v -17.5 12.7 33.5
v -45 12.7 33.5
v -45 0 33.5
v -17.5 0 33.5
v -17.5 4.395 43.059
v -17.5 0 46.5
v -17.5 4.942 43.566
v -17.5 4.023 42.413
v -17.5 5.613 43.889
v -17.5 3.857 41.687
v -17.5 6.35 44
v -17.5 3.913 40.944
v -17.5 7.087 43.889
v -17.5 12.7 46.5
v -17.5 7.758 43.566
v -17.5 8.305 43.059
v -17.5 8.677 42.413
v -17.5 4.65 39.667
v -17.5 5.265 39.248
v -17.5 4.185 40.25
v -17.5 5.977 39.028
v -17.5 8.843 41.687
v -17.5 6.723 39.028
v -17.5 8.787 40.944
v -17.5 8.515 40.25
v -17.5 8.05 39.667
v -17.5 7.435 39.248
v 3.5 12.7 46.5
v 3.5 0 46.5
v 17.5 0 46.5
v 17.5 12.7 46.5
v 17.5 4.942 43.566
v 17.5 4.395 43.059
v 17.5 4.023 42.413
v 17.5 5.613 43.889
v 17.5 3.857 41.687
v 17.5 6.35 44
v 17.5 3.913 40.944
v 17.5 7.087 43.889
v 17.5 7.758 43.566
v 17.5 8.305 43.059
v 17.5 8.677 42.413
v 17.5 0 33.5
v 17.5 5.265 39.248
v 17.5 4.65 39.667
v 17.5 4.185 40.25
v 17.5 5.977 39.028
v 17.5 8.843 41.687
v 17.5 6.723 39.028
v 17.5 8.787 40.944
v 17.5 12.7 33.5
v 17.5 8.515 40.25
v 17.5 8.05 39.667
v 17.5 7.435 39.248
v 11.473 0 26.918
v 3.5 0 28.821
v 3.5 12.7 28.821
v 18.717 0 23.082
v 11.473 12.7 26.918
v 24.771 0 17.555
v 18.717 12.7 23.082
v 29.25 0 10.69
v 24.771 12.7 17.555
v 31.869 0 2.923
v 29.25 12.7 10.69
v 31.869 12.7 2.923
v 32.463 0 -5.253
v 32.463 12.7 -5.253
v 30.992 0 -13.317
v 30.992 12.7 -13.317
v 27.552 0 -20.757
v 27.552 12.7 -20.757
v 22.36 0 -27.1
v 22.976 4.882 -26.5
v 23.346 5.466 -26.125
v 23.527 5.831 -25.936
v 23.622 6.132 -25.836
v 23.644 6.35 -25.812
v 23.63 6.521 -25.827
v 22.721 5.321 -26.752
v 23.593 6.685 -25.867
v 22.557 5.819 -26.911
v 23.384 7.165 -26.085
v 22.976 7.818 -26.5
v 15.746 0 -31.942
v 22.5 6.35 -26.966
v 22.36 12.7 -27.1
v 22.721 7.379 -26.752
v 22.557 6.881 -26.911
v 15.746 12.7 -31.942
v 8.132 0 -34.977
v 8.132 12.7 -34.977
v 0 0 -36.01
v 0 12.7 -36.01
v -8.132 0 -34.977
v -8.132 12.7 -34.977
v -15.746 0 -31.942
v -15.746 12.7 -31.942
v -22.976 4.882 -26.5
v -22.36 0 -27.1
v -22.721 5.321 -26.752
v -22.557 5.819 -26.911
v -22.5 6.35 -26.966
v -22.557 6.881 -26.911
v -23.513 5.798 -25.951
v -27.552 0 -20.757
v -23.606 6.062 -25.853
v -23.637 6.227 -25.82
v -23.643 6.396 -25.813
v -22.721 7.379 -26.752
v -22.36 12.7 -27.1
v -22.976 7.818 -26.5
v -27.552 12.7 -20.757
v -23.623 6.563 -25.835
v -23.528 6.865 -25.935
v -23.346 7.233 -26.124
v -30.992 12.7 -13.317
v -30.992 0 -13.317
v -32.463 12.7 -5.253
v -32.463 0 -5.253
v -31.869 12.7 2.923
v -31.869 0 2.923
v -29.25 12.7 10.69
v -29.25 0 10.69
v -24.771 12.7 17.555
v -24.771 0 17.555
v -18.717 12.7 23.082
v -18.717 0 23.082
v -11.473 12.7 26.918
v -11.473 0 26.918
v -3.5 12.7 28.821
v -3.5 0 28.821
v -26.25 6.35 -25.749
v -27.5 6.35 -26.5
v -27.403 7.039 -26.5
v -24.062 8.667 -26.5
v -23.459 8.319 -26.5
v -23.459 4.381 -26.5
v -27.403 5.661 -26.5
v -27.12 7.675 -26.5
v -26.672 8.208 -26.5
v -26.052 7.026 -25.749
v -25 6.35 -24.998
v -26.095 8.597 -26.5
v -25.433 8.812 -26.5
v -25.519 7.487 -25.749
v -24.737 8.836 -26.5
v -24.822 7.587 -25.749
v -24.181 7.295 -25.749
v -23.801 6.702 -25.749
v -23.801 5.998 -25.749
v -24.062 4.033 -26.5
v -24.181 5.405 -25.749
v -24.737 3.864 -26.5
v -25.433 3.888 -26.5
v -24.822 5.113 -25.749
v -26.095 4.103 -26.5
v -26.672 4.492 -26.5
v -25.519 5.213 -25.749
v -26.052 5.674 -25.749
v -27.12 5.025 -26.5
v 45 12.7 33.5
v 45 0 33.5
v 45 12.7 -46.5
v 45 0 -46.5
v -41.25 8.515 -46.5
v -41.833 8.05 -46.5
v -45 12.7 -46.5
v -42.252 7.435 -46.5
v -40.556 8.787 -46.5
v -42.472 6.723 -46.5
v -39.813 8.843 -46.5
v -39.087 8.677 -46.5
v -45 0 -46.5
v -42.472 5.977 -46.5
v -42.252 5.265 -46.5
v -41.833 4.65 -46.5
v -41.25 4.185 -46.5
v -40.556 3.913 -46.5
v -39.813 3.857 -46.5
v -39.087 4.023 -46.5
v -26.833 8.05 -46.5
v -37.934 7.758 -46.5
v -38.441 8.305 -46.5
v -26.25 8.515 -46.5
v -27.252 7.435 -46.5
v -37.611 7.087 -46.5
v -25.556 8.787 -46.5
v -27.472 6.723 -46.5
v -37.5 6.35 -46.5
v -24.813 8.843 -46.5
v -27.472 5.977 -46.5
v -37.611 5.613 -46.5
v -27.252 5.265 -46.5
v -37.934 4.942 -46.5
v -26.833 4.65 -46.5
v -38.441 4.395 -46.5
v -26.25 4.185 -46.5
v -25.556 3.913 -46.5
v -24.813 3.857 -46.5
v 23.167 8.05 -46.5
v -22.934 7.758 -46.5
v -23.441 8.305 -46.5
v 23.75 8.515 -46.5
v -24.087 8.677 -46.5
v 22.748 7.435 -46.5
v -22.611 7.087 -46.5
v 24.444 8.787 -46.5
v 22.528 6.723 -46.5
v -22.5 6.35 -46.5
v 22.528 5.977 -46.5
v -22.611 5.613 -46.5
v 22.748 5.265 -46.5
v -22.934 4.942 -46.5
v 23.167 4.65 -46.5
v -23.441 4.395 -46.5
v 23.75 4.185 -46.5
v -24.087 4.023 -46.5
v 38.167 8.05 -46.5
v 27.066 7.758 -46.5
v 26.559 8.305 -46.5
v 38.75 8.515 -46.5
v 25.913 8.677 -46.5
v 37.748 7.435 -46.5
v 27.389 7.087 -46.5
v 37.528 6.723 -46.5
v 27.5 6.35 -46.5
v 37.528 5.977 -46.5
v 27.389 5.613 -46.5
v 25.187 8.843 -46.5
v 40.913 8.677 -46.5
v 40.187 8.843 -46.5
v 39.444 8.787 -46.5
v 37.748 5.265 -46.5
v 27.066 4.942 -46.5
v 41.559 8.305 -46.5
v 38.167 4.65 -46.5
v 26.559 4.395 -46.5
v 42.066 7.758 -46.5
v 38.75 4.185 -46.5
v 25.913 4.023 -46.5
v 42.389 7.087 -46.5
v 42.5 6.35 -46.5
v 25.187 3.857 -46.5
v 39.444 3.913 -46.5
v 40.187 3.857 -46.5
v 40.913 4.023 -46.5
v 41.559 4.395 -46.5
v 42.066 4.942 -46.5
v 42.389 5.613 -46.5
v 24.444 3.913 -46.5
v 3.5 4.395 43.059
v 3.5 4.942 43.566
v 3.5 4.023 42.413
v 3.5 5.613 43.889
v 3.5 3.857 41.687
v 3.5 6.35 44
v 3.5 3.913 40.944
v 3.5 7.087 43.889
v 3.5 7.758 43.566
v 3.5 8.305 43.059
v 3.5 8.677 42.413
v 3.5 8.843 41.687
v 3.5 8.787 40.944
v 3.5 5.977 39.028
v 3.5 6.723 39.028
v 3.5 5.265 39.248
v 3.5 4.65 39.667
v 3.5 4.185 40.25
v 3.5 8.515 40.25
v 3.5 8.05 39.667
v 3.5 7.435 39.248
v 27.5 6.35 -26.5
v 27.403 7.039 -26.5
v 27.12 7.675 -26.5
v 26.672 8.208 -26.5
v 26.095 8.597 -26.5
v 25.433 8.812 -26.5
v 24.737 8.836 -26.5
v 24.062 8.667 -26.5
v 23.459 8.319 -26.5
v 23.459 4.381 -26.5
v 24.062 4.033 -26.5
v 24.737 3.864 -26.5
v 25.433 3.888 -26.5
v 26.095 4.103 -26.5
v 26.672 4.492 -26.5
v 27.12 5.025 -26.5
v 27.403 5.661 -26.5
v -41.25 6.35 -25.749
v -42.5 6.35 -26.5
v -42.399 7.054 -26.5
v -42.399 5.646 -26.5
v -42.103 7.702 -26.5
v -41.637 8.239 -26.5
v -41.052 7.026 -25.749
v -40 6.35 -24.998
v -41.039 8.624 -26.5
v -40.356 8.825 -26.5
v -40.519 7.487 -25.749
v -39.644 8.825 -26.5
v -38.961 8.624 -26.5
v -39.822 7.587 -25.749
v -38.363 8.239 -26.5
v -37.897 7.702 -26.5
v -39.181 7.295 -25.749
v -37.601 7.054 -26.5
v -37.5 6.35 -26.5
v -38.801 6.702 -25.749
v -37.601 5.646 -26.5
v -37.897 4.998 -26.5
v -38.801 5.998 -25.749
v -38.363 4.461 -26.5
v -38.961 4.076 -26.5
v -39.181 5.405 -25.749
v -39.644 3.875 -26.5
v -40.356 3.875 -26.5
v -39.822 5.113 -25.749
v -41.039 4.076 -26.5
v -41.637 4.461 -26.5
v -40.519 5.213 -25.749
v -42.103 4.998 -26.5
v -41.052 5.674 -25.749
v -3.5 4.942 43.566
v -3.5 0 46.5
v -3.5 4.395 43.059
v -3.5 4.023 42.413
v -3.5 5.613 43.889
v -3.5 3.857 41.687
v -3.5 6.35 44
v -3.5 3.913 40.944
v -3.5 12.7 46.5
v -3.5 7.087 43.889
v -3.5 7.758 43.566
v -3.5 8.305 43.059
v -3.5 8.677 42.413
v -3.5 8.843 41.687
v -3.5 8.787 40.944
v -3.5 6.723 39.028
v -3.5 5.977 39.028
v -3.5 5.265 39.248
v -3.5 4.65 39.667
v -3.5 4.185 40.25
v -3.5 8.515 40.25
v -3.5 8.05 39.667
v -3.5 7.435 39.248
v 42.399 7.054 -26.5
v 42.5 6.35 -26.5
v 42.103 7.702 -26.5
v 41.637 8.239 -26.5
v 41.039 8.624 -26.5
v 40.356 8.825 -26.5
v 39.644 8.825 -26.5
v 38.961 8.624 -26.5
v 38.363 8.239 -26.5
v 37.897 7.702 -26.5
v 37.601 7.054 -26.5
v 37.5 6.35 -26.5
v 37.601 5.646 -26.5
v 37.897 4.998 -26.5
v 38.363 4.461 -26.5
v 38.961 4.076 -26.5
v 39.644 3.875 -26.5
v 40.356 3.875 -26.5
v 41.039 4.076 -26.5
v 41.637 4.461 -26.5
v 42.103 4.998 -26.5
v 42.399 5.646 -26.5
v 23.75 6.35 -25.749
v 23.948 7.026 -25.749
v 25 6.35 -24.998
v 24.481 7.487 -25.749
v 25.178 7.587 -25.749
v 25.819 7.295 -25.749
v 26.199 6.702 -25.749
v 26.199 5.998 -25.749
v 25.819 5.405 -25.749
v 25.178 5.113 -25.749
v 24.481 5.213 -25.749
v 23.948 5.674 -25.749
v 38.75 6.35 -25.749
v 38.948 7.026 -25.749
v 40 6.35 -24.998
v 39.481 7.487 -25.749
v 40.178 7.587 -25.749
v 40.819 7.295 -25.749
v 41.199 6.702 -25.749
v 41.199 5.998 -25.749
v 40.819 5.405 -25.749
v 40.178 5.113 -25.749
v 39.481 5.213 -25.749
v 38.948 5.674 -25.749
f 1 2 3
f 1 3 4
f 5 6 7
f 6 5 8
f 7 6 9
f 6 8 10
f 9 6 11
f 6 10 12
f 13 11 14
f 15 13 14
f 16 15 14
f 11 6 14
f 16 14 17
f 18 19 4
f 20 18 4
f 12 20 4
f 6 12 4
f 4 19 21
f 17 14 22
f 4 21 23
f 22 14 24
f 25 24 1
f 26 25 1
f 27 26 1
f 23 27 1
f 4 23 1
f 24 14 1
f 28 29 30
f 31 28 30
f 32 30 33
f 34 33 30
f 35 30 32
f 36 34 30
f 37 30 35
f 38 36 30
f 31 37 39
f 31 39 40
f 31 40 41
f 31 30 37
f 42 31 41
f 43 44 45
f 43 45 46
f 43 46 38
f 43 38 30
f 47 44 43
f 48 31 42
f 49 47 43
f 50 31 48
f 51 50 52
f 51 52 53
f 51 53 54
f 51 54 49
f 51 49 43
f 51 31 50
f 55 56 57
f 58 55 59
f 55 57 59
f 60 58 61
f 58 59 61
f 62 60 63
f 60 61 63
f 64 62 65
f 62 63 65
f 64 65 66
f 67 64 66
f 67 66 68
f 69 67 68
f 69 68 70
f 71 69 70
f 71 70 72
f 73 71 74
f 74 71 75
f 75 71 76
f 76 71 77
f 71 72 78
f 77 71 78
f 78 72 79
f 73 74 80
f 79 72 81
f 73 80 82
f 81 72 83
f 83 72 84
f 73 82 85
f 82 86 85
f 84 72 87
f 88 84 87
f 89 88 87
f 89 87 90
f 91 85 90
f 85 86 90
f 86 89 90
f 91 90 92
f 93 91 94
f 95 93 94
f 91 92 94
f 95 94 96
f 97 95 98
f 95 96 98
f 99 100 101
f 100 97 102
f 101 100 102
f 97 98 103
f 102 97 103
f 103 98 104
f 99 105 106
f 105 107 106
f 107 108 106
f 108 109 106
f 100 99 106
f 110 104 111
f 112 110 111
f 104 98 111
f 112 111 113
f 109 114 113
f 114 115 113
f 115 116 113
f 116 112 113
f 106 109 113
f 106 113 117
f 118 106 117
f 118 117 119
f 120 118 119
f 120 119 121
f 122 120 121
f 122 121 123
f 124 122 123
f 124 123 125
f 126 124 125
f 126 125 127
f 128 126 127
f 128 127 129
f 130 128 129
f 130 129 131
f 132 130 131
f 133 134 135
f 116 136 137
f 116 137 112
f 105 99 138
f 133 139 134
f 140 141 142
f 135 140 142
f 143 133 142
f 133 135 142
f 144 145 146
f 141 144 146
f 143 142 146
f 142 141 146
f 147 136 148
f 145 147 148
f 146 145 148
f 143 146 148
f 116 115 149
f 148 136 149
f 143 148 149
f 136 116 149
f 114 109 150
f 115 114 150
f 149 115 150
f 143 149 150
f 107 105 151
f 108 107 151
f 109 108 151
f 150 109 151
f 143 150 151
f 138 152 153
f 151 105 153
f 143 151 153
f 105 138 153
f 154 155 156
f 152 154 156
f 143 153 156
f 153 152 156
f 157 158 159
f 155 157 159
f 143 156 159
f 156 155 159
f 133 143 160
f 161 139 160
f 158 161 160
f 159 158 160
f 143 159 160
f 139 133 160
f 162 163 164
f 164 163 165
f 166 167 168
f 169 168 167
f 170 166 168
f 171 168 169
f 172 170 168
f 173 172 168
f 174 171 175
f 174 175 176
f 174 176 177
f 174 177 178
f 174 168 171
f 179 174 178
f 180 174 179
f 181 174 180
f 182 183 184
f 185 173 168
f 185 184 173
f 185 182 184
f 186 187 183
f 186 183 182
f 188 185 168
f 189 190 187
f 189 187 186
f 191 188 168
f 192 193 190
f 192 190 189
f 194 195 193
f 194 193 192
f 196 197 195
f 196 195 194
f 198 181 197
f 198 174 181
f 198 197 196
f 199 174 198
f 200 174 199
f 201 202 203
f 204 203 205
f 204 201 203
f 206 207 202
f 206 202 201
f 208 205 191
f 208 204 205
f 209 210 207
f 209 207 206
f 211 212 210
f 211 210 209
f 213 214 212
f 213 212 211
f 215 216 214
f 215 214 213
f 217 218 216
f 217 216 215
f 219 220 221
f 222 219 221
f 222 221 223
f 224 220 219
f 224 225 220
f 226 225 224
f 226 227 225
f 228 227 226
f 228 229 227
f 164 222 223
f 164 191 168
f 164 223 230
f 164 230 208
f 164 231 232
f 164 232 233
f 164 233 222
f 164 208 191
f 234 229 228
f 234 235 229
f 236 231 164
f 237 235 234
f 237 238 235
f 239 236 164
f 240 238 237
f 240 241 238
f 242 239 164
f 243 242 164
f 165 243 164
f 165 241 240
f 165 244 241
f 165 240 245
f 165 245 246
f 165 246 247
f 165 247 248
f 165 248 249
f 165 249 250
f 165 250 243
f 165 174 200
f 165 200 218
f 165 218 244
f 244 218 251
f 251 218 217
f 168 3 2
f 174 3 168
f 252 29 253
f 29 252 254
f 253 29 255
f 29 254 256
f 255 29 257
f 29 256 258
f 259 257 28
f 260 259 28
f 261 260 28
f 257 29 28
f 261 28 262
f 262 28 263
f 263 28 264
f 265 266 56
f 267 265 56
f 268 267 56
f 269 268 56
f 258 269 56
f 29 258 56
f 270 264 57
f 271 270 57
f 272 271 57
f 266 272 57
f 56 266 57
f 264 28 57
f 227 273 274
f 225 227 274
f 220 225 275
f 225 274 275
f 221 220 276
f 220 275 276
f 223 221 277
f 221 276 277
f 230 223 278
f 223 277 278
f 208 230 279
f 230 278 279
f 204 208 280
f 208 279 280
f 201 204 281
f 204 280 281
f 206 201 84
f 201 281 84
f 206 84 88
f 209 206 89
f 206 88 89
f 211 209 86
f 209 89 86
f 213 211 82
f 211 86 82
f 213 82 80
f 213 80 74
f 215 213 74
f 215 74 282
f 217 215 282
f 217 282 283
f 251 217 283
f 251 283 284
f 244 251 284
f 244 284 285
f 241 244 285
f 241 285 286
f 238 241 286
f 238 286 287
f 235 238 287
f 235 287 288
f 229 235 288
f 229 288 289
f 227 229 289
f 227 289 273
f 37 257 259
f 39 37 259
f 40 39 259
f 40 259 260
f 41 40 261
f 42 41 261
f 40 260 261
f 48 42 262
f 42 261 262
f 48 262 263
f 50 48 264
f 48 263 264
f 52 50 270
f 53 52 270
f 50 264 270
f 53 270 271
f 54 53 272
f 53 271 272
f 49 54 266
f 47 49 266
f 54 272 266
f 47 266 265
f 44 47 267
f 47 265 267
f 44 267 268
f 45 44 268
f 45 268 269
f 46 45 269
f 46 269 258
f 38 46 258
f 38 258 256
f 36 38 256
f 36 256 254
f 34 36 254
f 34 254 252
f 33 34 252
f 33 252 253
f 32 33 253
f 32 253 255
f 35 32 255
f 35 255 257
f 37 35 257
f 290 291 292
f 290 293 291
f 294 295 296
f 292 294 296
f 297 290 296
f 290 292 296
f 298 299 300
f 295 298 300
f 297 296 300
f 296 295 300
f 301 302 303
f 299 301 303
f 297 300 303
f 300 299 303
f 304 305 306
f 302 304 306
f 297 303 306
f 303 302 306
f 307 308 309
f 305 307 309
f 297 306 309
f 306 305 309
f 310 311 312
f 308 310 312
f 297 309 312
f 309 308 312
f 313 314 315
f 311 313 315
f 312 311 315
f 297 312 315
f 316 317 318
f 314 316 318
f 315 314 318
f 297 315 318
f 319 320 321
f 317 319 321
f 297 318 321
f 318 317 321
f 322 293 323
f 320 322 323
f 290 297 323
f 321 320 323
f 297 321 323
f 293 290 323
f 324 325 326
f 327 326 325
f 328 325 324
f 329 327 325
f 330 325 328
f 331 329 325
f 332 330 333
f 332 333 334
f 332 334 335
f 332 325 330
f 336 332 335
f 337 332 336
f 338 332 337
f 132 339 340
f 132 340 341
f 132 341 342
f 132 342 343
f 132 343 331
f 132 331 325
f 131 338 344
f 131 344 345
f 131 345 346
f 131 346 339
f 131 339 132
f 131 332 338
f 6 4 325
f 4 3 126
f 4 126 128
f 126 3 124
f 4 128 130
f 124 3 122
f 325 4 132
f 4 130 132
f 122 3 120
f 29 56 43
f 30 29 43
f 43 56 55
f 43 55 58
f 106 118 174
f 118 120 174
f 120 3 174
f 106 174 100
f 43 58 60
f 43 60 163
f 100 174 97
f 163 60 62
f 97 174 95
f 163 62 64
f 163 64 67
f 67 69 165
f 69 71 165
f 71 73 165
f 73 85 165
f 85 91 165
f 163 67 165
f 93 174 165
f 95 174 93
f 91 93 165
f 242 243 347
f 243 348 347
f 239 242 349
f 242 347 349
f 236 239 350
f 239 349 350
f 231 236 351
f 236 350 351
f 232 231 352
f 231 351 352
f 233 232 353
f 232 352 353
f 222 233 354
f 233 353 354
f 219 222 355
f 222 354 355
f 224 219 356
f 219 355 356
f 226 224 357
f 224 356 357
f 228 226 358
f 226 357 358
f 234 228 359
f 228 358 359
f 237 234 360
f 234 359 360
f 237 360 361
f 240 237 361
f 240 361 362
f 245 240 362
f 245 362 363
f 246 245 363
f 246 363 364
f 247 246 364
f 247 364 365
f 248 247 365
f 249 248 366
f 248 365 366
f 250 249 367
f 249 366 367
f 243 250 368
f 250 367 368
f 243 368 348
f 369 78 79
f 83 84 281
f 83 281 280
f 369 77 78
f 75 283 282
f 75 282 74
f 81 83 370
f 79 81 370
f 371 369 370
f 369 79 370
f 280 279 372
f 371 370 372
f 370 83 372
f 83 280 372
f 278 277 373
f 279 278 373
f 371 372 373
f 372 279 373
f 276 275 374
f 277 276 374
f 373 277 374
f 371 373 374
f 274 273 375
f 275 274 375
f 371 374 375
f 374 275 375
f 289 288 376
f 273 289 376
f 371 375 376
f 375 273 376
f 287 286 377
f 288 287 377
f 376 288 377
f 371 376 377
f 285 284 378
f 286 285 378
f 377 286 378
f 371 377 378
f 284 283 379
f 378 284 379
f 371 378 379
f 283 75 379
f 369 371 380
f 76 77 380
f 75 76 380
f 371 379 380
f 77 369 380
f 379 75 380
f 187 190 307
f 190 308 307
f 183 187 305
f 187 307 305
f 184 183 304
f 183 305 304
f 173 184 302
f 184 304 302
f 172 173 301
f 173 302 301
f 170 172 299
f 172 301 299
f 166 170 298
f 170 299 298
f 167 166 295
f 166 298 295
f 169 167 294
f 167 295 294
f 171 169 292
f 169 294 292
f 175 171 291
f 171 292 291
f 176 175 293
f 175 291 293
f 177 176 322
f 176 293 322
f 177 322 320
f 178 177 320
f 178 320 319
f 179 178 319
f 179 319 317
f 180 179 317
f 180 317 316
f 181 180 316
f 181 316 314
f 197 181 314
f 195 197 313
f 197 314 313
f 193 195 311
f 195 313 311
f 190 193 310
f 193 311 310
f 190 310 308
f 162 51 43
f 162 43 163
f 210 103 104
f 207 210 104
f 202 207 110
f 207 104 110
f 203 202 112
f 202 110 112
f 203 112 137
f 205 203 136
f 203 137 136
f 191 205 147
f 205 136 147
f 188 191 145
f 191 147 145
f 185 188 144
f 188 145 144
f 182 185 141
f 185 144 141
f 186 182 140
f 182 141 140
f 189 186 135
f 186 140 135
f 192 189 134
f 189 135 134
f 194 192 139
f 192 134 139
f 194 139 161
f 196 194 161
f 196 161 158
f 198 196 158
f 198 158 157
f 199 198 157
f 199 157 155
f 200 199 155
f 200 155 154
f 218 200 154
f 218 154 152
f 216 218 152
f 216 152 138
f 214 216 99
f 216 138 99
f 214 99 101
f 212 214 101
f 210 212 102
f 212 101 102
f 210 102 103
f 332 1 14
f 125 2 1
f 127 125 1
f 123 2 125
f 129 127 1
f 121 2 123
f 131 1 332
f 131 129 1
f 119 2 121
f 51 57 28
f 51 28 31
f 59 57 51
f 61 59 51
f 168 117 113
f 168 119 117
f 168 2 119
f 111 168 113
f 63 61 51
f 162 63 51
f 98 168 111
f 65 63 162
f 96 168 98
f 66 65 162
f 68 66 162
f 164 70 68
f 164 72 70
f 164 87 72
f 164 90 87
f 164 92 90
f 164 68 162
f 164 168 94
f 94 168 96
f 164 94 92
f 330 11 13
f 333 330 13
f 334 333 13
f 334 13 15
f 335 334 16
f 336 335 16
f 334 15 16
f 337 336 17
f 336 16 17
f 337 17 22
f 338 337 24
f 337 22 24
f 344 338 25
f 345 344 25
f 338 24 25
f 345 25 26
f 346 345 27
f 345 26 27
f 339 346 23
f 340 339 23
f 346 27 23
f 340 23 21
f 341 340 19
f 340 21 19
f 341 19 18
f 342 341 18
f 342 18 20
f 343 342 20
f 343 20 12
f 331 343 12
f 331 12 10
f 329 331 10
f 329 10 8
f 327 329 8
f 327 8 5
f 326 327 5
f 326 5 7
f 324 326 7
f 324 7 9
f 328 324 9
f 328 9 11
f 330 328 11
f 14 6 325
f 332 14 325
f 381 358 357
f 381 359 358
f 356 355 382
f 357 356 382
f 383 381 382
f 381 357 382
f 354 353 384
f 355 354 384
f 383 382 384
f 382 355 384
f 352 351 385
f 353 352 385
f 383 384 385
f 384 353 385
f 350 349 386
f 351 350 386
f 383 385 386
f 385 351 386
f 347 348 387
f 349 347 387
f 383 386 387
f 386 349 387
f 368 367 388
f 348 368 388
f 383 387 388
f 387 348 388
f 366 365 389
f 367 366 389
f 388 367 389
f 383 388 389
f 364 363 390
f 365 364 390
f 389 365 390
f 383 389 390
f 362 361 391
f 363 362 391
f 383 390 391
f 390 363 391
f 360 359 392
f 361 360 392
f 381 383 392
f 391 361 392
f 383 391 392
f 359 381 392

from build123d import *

# Parameters (mm, degrees)
ESBO_O1_W                          = 90
ESBO_O1_H                          = 93
RESSALTO_EXTRUS_O1_DEPTH           = 12.7
ESBO_O3_R                          = 32.51
CORTE_EXTRUS_O2_DEPTH              = 66.943460631
CORTE_EXTRUS_O4_REACH              = 67.943
ESBO_O5_W                          = 27.5
ESBO_O5_H                          = 13
CORTE_EXTRUS_O5_REACH              = 67.943
ESBO_O6_W                          = 7
ESBO_O6_H                          = 26.329700269
CORTE_EXTRUS_O6_REACH              = 80.929
ESBO_O7_R                          = 2.5
TALADRO_DE_MARGEN_PARA_00001_D     = 5
TALADRO_DE_MARGEN_PARA_00001_DEPTH = 20
TALADRO_DE_MARGEN_PARA_00001_TIP   = 1.502151548


with BuildPart() as part:
    # Esboço1 → Ressalto-extrusão1 (new body)
    with BuildSketch(Plane(origin=(0, 0, 0), x_dir=(1, 0, 0), z_dir=(0, 1, 0))):
        Rectangle(ESBO_O1_W, ESBO_O1_H)
    extrude(amount=RESSALTO_EXTRUS_O1_DEPTH)

    # Esboço3 → Corte-extrusão2 (cut, through all)
    with BuildSketch(Plane(origin=(0, 12.7, 0), x_dir=(1, 0, 0), z_dir=(0, 1, 0))):
        with Locations(Location((0, 3.5, 0), (0, 0, 270))):
            Circle(ESBO_O3_R)
    extrude(amount=-CORTE_EXTRUS_O2_DEPTH, mode=Mode.SUBTRACT)

    # Esboço5 → Corte-extrusão4 (cut, up to next)
    with BuildSketch(Plane(origin=(0, 12.7, 0), x_dir=(1, 0, 0), z_dir=(0, 1, 0)), mode=Mode.PRIVATE) as corte_extrus_o4_sk1:
        with Locations((31.25, -40)):
            Rectangle(ESBO_O5_W, ESBO_O5_H)
    corte_extrus_o4_tool1 = extrude(corte_extrus_o4_sk1.sketch, amount=-CORTE_EXTRUS_O4_REACH, mode=Mode.PRIVATE) & part.part
    # Esboço5 → Corte-extrusão4 (cut, up to next)
    with BuildSketch(Plane(origin=(0, 12.7, 0), x_dir=(1, 0, 0), z_dir=(0, 1, 0)), mode=Mode.PRIVATE) as corte_extrus_o4_sk2:
        with Locations((-31.25, -40)):
            Rectangle(ESBO_O5_W, ESBO_O5_H)
    corte_extrus_o4_tool2 = extrude(corte_extrus_o4_sk2.sketch, amount=-CORTE_EXTRUS_O4_REACH, mode=Mode.PRIVATE) & part.part
    add(corte_extrus_o4_tool1.solids().sort_by_distance((31.25, 12.7, 40))[0], mode=Mode.SUBTRACT)
    add(corte_extrus_o4_tool2.solids().sort_by_distance((-31.25, 12.7, 40))[0], mode=Mode.SUBTRACT)

    # Esboço6 → Corte-extrusão5 (cut, up to next)
    with BuildSketch(Plane(origin=(0, 12.7, 0), x_dir=(1, 0, 0), z_dir=(0, 1, 0)), mode=Mode.PRIVATE) as corte_extrus_o5_sk1:
        with Locations((0, -33.335149866)):
            Rectangle(ESBO_O6_W, ESBO_O6_H)
    corte_extrus_o5_tool1 = extrude(corte_extrus_o5_sk1.sketch, amount=-CORTE_EXTRUS_O5_REACH, mode=Mode.PRIVATE) & part.part
    add(corte_extrus_o5_tool1.solids().sort_by_distance((0, 12.7, 33.33515))[0], mode=Mode.SUBTRACT)

    # Corte-extrusão6: up to this face of the body (flat: up to its plane)
    corte_extrus_o6_end = Plane(part.part.faces().sort_by_distance((17.5, 6.35, 40))[0])
    # Esboço7 → Corte-extrusão6 (cut, up to the picked face)
    with BuildSketch(Plane.ZY.offset(17.5), mode=Mode.PRIVATE) as corte_extrus_o6_sk1:
        with Locations((41.5, 6.35)):
            Circle(ESBO_O7_R)
    corte_extrus_o6_tool1 = split(extrude(corte_extrus_o6_sk1.sketch, amount=-CORTE_EXTRUS_O6_REACH, mode=Mode.PRIVATE), bisect_by=corte_extrus_o6_end, keep=Keep.BOTH, mode=Mode.PRIVATE)
    add(corte_extrus_o6_tool1.solids().sort_by(Axis((-17.5, 6.35, 41.5), (1, 0, 0)))[0], mode=Mode.SUBTRACT)

    # Taladro de margen para #00001
    with Locations(Plane(origin=(0, 0, -46.5), x_dir=(-1, 0, 0), z_dir=(0, 0, -1))):
        with Locations((-40, 6.35), (-25, 6.35), (40, 6.35), (25, 6.35)):
            Hole(TALADRO_DE_MARGEN_PARA_00001_D / 2, depth=TALADRO_DE_MARGEN_PARA_00001_DEPTH)
            with Locations((0, 0, -(TALADRO_DE_MARGEN_PARA_00001_DEPTH + TALADRO_DE_MARGEN_PARA_00001_TIP / 2))):  # 118° drill point
                Cone(0, TALADRO_DE_MARGEN_PARA_00001_D / 2, TALADRO_DE_MARGEN_PARA_00001_TIP, mode=Mode.SUBTRACT)


solid = part.part
